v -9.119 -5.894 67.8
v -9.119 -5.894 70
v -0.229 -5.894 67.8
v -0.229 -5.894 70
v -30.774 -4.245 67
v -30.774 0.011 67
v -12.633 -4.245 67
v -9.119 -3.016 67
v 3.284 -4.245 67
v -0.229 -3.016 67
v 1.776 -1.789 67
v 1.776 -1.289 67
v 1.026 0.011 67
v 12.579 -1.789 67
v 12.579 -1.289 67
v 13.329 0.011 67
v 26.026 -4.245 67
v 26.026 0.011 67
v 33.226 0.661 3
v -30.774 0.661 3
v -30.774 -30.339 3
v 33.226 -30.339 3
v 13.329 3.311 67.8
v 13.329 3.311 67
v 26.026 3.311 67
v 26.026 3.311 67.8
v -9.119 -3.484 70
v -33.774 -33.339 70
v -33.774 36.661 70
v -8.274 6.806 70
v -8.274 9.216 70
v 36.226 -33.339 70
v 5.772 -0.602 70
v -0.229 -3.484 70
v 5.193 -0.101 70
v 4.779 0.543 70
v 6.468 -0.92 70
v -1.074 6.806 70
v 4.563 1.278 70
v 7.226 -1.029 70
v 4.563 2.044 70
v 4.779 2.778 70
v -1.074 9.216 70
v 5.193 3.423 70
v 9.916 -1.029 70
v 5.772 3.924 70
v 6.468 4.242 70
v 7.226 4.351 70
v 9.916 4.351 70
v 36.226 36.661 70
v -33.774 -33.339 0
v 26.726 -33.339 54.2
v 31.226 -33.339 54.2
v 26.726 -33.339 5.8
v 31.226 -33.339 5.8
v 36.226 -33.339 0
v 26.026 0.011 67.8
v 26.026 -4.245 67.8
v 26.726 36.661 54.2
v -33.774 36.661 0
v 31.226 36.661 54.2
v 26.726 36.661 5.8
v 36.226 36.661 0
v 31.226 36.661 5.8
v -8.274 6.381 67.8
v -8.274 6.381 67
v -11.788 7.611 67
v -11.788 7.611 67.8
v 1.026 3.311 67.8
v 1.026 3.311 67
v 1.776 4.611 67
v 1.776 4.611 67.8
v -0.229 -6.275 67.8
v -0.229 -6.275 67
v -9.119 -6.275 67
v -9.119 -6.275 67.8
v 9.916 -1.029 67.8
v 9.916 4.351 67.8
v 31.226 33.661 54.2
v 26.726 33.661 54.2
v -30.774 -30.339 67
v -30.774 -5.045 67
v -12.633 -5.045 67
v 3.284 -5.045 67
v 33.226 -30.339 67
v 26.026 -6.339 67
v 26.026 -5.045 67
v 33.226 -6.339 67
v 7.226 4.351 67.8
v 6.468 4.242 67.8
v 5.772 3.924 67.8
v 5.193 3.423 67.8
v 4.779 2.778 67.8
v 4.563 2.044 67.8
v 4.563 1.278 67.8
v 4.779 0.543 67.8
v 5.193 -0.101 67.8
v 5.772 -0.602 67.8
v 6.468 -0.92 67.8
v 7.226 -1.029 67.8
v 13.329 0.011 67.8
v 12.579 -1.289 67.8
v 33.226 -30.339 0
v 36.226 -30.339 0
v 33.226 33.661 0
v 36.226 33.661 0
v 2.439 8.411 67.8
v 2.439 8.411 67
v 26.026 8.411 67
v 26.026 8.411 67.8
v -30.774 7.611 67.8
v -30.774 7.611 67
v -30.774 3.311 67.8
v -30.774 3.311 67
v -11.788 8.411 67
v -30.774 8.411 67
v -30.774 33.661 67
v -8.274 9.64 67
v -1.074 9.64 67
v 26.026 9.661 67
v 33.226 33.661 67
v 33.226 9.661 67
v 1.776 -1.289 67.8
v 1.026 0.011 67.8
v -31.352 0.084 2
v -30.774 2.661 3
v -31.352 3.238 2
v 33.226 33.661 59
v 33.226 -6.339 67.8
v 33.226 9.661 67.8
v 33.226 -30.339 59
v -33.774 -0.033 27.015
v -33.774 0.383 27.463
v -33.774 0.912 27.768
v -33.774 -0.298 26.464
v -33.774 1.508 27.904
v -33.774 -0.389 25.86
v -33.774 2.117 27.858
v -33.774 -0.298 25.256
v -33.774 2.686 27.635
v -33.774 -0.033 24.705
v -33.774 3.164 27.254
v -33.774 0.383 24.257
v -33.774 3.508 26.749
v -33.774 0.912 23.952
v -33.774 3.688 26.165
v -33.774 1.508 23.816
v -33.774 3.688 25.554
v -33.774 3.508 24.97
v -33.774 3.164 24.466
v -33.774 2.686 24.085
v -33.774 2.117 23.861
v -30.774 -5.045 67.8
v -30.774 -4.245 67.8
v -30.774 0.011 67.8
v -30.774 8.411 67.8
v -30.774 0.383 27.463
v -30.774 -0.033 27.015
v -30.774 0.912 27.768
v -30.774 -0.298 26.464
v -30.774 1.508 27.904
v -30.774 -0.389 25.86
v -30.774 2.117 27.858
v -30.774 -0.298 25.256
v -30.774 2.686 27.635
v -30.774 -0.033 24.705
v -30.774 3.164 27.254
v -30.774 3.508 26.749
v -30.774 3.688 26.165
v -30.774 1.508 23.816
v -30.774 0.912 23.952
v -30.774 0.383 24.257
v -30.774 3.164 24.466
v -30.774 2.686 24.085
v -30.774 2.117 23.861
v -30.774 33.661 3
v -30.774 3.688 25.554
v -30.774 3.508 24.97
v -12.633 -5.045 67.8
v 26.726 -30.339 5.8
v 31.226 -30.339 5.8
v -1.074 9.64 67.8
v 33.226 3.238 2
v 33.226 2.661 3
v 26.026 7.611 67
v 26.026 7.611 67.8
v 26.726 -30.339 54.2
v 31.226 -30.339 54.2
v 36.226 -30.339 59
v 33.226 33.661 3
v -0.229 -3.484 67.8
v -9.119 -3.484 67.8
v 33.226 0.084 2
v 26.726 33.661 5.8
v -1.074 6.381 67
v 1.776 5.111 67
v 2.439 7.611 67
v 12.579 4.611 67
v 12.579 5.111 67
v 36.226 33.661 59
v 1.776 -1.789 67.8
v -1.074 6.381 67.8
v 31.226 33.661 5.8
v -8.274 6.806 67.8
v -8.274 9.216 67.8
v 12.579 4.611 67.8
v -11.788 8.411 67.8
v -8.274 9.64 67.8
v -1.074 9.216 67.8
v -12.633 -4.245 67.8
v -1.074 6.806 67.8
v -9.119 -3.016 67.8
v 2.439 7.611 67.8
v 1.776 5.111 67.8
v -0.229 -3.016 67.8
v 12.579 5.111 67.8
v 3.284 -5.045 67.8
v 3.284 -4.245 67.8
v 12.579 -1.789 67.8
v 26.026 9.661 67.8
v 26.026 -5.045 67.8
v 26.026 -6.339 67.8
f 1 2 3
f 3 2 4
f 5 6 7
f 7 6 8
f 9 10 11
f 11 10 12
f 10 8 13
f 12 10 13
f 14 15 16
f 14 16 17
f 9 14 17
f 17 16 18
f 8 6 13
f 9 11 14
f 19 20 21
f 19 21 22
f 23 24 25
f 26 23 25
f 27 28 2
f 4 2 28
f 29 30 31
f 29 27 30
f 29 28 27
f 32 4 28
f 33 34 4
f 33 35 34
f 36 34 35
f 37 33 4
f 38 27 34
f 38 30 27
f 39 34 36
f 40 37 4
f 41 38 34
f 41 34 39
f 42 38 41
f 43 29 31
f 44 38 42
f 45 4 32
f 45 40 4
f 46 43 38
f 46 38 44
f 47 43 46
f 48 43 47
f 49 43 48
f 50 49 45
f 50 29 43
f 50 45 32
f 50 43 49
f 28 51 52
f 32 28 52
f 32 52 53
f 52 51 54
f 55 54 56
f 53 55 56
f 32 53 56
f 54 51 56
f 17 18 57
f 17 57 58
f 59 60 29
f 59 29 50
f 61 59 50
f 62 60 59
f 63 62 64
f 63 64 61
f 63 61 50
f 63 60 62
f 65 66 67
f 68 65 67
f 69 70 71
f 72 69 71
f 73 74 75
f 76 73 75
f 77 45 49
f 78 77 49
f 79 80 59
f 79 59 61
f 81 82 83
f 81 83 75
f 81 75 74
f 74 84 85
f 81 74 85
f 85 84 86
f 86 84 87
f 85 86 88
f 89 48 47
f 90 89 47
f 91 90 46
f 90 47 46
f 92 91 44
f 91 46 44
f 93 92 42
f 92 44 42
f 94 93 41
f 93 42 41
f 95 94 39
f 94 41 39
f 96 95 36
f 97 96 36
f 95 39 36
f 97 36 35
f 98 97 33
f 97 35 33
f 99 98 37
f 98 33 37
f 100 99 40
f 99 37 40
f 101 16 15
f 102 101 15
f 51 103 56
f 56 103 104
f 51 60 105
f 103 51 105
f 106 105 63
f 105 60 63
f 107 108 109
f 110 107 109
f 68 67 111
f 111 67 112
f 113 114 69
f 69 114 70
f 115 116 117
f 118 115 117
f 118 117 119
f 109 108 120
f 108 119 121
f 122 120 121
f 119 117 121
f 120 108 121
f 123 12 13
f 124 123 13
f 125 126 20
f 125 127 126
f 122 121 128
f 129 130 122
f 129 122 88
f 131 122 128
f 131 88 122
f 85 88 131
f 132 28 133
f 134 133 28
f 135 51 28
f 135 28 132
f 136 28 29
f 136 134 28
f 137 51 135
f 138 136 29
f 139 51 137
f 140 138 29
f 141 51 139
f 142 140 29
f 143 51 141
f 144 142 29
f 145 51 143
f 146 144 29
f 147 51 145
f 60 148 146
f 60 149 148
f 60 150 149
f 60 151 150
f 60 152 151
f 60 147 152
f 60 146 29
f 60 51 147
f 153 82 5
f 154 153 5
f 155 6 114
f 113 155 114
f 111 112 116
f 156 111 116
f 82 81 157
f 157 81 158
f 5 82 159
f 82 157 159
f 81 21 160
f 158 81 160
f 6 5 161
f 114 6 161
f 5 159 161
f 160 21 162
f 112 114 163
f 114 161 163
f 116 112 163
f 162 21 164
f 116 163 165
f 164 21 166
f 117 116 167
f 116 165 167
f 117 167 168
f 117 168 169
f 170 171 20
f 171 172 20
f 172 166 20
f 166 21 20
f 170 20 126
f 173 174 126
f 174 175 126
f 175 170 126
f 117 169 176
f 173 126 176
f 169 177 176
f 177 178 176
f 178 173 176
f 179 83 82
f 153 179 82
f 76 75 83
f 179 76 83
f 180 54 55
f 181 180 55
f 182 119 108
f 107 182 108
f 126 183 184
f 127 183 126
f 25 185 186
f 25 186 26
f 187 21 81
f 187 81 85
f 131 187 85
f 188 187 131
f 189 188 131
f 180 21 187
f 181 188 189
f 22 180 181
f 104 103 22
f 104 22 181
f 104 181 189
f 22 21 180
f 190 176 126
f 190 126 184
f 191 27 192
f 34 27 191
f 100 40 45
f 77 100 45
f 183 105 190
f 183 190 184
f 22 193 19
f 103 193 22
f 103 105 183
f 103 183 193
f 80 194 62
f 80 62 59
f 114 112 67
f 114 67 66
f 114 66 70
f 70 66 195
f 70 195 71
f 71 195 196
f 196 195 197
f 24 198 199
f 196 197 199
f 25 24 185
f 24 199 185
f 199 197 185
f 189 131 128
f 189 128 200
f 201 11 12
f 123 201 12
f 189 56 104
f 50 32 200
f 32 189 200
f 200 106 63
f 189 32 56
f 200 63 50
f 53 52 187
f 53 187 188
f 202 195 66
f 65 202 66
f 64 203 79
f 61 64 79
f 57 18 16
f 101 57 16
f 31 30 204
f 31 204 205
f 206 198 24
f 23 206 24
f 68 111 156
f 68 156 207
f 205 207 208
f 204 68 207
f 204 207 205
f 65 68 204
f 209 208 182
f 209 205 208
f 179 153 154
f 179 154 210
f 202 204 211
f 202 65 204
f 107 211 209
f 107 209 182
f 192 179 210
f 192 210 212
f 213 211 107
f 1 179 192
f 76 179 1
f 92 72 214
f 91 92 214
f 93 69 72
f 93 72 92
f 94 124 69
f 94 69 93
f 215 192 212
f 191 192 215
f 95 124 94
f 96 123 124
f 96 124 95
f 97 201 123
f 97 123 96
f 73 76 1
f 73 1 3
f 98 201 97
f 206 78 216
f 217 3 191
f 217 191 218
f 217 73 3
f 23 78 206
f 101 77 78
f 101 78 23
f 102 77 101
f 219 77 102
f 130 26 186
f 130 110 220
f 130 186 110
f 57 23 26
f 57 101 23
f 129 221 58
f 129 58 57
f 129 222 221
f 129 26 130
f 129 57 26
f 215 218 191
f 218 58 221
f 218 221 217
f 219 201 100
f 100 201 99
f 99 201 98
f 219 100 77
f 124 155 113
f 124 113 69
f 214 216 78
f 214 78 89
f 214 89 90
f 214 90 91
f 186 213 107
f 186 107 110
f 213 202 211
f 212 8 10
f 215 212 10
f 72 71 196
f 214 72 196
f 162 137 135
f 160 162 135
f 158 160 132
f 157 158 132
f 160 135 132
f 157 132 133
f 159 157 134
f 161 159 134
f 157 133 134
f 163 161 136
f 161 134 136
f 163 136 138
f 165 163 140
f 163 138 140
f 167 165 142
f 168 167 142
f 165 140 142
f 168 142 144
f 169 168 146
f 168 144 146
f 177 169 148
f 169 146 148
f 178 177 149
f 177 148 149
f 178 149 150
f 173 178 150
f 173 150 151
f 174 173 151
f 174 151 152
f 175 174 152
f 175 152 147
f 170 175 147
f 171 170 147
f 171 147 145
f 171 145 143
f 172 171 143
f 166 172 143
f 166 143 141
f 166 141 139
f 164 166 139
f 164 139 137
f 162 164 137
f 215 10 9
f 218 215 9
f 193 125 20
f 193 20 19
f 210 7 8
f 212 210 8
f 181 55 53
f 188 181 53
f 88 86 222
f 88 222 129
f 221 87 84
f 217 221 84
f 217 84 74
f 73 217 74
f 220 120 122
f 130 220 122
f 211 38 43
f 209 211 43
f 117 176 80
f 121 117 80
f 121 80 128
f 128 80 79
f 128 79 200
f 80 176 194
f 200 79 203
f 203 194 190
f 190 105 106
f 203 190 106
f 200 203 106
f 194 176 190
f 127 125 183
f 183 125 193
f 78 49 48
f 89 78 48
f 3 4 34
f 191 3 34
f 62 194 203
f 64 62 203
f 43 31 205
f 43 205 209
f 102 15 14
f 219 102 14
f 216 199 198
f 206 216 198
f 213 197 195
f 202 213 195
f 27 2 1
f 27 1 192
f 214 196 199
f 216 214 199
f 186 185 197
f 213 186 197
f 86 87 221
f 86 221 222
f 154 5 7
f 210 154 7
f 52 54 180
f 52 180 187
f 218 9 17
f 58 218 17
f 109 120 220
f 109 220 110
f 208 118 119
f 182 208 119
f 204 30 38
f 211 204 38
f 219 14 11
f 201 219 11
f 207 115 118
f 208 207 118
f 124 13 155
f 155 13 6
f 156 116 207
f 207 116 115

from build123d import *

# Parameters (mm, degrees)
F0_W      = 70
F0_H      = 70
F1_DEPTH  = 70
F2_T      = -3
F3_W      = 8.89
F3_H      = 2.41
F3_W_2    = 7.2
F4_DEPTH  = 2.54
F5_W      = 3
F5_H      = 64
F6_DEPTH  = 8
F7_R      = 2.05
F8_DEPTH  = 3.302
F9_W      = 4.5
F9_H      = 48.4
F10_DEPTH = 99.568
F11_W     = 67
F11_H     = 2
F12_DEPTH = 1
F12_TAPER = -30
F14_DEPTH = 0.8
F16_DEPTH = 0.8
F17_W     = 7.2
F17_H     = 1.2938163138
F17_H_2   = 4.2561836862
F17_H_3   = 6.35
F18_DEPTH = 0.8
F20_DEPTH = 0.8
F21_W     = 3
F21_H     = 64
F22_DEPTH = 4.6


# Not quite as in the source:
# - a feature names something its author has since deleted; it is built from what else it names


with BuildPart() as f1:
    # F0 (on Top) → F1 (new body)
    with BuildSketch(Plane.XY):
        with Locations((1.2258447155, 1.6609302163)):
            Rectangle(F0_W, F0_H)
    extrude(amount=F1_DEPTH)

    # F2
    f2_openings = [f1.faces().sort_by_distance(p)[0] for p in [
        (36.225845, 1.66093, 35),
    ]]
    offset(amount=F2_T, openings=f2_openings)

    # F3 (on face) → F4 (cut)
    with BuildSketch(Plane.XY.offset(70)):
        with Locations((-4.6741552845, -4.6890697837)):
            Rectangle(F3_W, F3_H)
        with BuildLine():
            ThreePointArc((7.2258447155, -1.0290697837), (9.1279619569, -0.2411870251), (9.9158447155, 1.6609302163))
            ThreePointArc((9.9158447155, 1.6609302163), (9.1279619569, 3.5630474577), (7.2258447155, 4.3509302163))
            ThreePointArc((7.2258447155, 4.3509302163), (4.5358447155, 1.6609302163), (7.2258447155, -1.0290697837))
        make_face()
        with BuildLine():
            Line((9.9158447155, -1.0290697837), (9.9158447155, 1.6609302163))
            ThreePointArc((9.9158447155, 1.6609302163), (9.1279619569, -0.2411870251), (7.2258447155, -1.0290697837))
            Line((7.2258447155, -1.0290697837), (9.9158447155, -1.0290697837))
        make_face()
        with Locations((-4.6741552845, 8.0109302163)):
            Rectangle(F3_W_2, F3_H)
        with BuildLine():
            ThreePointArc((7.2258447155, 4.3509302163), (9.1279619569, 3.5630474577), (9.9158447155, 1.6609302163))
            Line((9.9158447155, 1.6609302163), (9.9158447155, 4.3509302163))
            Line((9.9158447155, 4.3509302163), (7.2258447155, 4.3509302163))
        make_face()
    extrude(amount=-F4_DEPTH, mode=Mode.SUBTRACT)

    # F5 (on face) → F6 (join)
    with BuildSketch(Plane(origin=(0, 0, 67), x_dir=(1, 0, 0), z_dir=(0, 0, -1))):
        with Locations((34.7258447155, -1.6609302163)):
            Rectangle(F5_W, F5_H)
    extrude(amount=F6_DEPTH)

    # F7 (on face) → F8 (cut)
    with BuildSketch(Plane(origin=(-33.7741552845, 0, 0), x_dir=(0, -1, 0), z_dir=(-1, 0, 0))):
        with Locations((-1.6609302163, 25.8598876931)):
            Circle(F7_R)
    extrude(amount=-F8_DEPTH, mode=Mode.SUBTRACT)

    # F9 (on face) → F10 (cut)
    with BuildSketch(Plane.XZ.offset(33.3390697837)):
        with Locations((28.9758447155, 30)):
            Rectangle(F9_W, F9_H)
    extrude(amount=-F10_DEPTH, mode=Mode.SUBTRACT)

    # F11 (on face) → F12 (cut)
    with BuildSketch(Plane.XY.offset(3)):
        with Locations((2.7258447155, 1.6609302163)):
            Rectangle(F11_W, F11_H)
    extrude(amount=-F12_DEPTH, taper=F12_TAPER, mode=Mode.SUBTRACT)

    # F13 (on face) → F14 (cut)
    with BuildSketch(Plane(origin=(0, 0, 67), x_dir=(1, 0, 0), z_dir=(0, 0, -1))):
        Polygon((-30.7741552845, -0.0109302163), (-30.7741552845, -3.3109302163), (1.0258447155, -3.3109302163), (1.7764000655, -4.6109302163), (1.7764000655, -5.1109302163), (12.5788900655, -5.1109302163), (12.5788900655, -4.6109302163), (13.3294454154, -3.3109302163), (33.2258447155, -3.3109302163), (33.2258447155, -0.0109302163), (13.3294454154, -0.0109302163), (12.5788900655, 1.2890697837), (12.5788900655, 1.7890697837), (1.7764000655, 1.7890697837), (1.7764000655, 1.2890697837), (1.0258447155, -0.0109302163), align=None)
    extrude(amount=-F14_DEPTH, mode=Mode.SUBTRACT)

    # F15 (on face) → F16 (cut)
    with BuildSketch(Plane(origin=(0, 0, 67), x_dir=(1, 0, 0), z_dir=(0, 0, -1))):
        Polygon((-30.7741552845, 5.0452534699), (-30.7741552845, 4.2452534699), (-12.6326995774, 4.2452534699), (-9.1191552845, 3.0155129674), (-0.2291552845, 3.0155129674), (3.2843890084, 4.2452534699), (33.2258447155, 4.2452534699), (33.2258447155, 5.0452534699), (3.2843890084, 5.0452534699), (-0.2291552845, 6.2749939724), (-9.1191552845, 6.2749939724), (-12.6326995774, 5.0452534699), align=None)
    extrude(amount=-F16_DEPTH, mode=Mode.SUBTRACT)

    # F17 (on face) → F18 (cut)
    with BuildSketch(Plane(origin=(0, 0, 67), x_dir=(1, 0, 0), z_dir=(0, 0, -1))):
        with Locations((29.6258447155, 5.6921616268)):
            Rectangle(F17_W, F17_H)
        with Locations((29.6258447155, 2.1171616268)):
            Rectangle(F17_W, F17_H_2)
        with Locations((29.6258447155, -6.4859302163)):
            Rectangle(F17_W, F17_H_3)
    extrude(amount=-F18_DEPTH, mode=Mode.SUBTRACT)

    # F19 (on face) → F20 (cut)
    with BuildSketch(Plane(origin=(0, 0, 67), x_dir=(1, 0, 0), z_dir=(0, 0, -1))):
        Polygon((26.0258447155, -8.4106897138), (26.0258447155, -7.6106897138), (2.4393890084, -7.6106897138), (-1.0741552845, -6.3809492113), (-8.2741552845, -6.3809492113), (-11.7876995774, -7.6106897138), (-30.7741552845, -7.6106897138), (-30.7741552845, -8.4106897138), (-11.7876995774, -8.4106897138), (-8.2741552845, -9.6404302163), (-1.0741552845, -9.6404302163), (2.4393890084, -8.4106897138), align=None)
    extrude(amount=-F20_DEPTH, mode=Mode.SUBTRACT)

    # F21 (on face) → F22 (cut)
    with BuildSketch(Plane(origin=(0, 0, 0), x_dir=(1, 0, 0), z_dir=(0, 0, -1))):
        with Locations((34.7258447155, -1.6609302163)):
            Rectangle(F21_W, F21_H)
    extrude(amount=-F22_DEPTH, mode=Mode.SUBTRACT)


solid = f1.part
